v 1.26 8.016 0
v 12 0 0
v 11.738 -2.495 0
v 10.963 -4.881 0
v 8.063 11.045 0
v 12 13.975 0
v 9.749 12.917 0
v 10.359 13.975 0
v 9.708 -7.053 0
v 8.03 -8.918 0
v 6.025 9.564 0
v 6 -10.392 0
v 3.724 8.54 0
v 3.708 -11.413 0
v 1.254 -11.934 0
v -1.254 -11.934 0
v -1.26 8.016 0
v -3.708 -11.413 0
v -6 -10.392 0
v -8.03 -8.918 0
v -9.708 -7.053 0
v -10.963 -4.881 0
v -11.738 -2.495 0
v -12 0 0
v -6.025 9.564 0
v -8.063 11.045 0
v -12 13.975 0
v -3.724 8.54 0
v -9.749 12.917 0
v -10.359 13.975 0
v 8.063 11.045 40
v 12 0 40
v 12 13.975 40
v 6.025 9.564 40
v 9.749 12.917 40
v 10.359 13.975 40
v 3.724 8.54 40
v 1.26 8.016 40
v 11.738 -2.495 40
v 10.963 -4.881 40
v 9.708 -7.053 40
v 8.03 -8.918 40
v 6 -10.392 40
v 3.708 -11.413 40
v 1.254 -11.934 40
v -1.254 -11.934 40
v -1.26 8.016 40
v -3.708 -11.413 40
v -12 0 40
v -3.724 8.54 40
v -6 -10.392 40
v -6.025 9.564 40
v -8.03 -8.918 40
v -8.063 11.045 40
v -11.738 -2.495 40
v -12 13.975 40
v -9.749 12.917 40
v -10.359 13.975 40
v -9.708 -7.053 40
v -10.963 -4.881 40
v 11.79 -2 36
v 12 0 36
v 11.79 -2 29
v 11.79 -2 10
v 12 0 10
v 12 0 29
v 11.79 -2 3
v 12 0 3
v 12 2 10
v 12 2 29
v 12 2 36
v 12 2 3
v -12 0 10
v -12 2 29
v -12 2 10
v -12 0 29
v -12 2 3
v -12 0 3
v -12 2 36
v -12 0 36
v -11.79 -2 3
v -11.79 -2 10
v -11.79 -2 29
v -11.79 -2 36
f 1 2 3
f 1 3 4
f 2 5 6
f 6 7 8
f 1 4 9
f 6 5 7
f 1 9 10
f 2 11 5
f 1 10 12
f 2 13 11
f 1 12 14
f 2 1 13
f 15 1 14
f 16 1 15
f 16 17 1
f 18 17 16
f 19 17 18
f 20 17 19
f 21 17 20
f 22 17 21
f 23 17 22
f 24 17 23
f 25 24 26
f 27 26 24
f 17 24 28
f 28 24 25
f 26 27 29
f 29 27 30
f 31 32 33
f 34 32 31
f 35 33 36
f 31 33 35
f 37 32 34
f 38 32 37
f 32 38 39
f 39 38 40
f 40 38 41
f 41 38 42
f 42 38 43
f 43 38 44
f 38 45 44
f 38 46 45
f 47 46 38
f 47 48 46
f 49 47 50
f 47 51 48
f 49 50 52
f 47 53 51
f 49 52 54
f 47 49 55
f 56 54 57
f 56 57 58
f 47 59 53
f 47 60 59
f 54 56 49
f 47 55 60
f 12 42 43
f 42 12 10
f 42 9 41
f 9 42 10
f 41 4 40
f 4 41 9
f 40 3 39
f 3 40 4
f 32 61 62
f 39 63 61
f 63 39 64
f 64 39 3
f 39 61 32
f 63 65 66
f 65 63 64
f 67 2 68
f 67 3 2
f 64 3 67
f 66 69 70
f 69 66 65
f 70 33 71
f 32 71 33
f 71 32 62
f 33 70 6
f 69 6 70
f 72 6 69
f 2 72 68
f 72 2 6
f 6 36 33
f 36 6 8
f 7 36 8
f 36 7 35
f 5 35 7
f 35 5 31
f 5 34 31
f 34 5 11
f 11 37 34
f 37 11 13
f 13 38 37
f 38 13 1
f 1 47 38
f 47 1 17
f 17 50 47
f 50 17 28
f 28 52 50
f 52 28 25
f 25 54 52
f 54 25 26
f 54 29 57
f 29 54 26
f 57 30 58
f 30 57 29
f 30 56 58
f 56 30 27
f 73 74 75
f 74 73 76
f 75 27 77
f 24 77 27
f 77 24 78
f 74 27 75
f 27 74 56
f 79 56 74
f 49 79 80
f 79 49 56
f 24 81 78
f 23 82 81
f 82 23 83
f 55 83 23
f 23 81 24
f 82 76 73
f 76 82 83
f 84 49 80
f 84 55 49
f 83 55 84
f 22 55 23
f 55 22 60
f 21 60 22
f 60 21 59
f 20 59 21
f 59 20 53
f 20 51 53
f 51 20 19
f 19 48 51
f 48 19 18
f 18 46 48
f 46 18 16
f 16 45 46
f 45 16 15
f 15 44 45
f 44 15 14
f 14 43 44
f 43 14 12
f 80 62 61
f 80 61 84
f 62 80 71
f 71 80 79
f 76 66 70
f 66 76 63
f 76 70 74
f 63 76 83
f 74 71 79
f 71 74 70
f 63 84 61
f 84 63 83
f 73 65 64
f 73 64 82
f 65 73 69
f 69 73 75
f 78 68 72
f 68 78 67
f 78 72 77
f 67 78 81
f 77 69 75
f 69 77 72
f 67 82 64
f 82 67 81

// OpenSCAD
bulgeRadius = 12;
bulgeHeight = 20;
bulgeLength = 20;
bulgeDepth  = 40;

holeWidth = 4;
holeHeight = 7;

module bulge() {
  linear_extrude(bulgeDepth)
  difference(){
    hull() {    
      circle(bulgeRadius);

      translate([0,bulgeHeight,0])
        circle(bulgeRadius);
    }
    

    translate([0,bulgeHeight,0])
    union(){
      circle(bulgeRadius + .05);
      square([bulgeRadius*2 + 0.05, bulgeRadius + .05], true);
    }
  }
}

module throughHole() {
  translate([0,0,holeHeight/2])
    cube([bulgeRadius*2+0.1, holeWidth, holeHeight], true);
}

difference(){
  bulge();
  
  translate([0,0,bulgeDepth - holeHeight- holeWidth])
  throughHole();
  
  translate([0,0,holeHeight- holeWidth])
  throughHole();
}
